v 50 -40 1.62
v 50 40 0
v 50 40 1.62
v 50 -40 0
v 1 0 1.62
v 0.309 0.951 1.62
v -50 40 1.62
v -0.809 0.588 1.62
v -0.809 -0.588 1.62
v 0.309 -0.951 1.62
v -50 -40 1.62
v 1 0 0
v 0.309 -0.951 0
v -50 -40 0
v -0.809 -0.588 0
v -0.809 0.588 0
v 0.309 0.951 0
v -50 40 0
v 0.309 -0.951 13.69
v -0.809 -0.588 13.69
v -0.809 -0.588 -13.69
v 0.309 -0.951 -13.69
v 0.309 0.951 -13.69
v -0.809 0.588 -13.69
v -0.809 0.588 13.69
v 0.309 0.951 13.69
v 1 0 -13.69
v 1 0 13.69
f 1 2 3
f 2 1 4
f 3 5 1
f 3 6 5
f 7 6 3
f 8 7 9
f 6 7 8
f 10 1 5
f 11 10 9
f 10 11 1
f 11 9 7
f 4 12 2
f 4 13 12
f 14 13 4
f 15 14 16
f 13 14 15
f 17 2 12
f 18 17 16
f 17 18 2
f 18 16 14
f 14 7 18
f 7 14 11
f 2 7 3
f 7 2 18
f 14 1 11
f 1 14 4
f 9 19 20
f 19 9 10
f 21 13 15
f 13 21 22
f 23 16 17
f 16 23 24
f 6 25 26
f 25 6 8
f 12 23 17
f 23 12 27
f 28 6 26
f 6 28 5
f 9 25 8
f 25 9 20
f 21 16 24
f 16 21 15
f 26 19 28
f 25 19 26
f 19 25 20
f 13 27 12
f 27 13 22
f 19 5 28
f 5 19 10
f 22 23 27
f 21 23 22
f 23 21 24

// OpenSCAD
// nano has width 100mm, 80mm, 29m
nano_full_height = 29;

nano_width = 100;
nano_depth = 80;

nano_pcb_height = 1.62;

module pcb_material() {
	union() {
		translate([0, 0, (nano_pcb_height) / 2]) { // anchored to z = 0
			cube([100, 80, 1.62], center = true); // base pcb size is 1.62 mm tall
		}
	}
}

module screw_holes() {
	union() {
		translate([0, 0, 0]) {
			cylinder(h = (nano_full_height - nano_pcb_height), r1 = 1, r2 = 1, center = true );
		}
	}
}

module jetson_nano() {
	union() {
		pcb_material();
		screw_holes();
	}
}

jetson_nano();
